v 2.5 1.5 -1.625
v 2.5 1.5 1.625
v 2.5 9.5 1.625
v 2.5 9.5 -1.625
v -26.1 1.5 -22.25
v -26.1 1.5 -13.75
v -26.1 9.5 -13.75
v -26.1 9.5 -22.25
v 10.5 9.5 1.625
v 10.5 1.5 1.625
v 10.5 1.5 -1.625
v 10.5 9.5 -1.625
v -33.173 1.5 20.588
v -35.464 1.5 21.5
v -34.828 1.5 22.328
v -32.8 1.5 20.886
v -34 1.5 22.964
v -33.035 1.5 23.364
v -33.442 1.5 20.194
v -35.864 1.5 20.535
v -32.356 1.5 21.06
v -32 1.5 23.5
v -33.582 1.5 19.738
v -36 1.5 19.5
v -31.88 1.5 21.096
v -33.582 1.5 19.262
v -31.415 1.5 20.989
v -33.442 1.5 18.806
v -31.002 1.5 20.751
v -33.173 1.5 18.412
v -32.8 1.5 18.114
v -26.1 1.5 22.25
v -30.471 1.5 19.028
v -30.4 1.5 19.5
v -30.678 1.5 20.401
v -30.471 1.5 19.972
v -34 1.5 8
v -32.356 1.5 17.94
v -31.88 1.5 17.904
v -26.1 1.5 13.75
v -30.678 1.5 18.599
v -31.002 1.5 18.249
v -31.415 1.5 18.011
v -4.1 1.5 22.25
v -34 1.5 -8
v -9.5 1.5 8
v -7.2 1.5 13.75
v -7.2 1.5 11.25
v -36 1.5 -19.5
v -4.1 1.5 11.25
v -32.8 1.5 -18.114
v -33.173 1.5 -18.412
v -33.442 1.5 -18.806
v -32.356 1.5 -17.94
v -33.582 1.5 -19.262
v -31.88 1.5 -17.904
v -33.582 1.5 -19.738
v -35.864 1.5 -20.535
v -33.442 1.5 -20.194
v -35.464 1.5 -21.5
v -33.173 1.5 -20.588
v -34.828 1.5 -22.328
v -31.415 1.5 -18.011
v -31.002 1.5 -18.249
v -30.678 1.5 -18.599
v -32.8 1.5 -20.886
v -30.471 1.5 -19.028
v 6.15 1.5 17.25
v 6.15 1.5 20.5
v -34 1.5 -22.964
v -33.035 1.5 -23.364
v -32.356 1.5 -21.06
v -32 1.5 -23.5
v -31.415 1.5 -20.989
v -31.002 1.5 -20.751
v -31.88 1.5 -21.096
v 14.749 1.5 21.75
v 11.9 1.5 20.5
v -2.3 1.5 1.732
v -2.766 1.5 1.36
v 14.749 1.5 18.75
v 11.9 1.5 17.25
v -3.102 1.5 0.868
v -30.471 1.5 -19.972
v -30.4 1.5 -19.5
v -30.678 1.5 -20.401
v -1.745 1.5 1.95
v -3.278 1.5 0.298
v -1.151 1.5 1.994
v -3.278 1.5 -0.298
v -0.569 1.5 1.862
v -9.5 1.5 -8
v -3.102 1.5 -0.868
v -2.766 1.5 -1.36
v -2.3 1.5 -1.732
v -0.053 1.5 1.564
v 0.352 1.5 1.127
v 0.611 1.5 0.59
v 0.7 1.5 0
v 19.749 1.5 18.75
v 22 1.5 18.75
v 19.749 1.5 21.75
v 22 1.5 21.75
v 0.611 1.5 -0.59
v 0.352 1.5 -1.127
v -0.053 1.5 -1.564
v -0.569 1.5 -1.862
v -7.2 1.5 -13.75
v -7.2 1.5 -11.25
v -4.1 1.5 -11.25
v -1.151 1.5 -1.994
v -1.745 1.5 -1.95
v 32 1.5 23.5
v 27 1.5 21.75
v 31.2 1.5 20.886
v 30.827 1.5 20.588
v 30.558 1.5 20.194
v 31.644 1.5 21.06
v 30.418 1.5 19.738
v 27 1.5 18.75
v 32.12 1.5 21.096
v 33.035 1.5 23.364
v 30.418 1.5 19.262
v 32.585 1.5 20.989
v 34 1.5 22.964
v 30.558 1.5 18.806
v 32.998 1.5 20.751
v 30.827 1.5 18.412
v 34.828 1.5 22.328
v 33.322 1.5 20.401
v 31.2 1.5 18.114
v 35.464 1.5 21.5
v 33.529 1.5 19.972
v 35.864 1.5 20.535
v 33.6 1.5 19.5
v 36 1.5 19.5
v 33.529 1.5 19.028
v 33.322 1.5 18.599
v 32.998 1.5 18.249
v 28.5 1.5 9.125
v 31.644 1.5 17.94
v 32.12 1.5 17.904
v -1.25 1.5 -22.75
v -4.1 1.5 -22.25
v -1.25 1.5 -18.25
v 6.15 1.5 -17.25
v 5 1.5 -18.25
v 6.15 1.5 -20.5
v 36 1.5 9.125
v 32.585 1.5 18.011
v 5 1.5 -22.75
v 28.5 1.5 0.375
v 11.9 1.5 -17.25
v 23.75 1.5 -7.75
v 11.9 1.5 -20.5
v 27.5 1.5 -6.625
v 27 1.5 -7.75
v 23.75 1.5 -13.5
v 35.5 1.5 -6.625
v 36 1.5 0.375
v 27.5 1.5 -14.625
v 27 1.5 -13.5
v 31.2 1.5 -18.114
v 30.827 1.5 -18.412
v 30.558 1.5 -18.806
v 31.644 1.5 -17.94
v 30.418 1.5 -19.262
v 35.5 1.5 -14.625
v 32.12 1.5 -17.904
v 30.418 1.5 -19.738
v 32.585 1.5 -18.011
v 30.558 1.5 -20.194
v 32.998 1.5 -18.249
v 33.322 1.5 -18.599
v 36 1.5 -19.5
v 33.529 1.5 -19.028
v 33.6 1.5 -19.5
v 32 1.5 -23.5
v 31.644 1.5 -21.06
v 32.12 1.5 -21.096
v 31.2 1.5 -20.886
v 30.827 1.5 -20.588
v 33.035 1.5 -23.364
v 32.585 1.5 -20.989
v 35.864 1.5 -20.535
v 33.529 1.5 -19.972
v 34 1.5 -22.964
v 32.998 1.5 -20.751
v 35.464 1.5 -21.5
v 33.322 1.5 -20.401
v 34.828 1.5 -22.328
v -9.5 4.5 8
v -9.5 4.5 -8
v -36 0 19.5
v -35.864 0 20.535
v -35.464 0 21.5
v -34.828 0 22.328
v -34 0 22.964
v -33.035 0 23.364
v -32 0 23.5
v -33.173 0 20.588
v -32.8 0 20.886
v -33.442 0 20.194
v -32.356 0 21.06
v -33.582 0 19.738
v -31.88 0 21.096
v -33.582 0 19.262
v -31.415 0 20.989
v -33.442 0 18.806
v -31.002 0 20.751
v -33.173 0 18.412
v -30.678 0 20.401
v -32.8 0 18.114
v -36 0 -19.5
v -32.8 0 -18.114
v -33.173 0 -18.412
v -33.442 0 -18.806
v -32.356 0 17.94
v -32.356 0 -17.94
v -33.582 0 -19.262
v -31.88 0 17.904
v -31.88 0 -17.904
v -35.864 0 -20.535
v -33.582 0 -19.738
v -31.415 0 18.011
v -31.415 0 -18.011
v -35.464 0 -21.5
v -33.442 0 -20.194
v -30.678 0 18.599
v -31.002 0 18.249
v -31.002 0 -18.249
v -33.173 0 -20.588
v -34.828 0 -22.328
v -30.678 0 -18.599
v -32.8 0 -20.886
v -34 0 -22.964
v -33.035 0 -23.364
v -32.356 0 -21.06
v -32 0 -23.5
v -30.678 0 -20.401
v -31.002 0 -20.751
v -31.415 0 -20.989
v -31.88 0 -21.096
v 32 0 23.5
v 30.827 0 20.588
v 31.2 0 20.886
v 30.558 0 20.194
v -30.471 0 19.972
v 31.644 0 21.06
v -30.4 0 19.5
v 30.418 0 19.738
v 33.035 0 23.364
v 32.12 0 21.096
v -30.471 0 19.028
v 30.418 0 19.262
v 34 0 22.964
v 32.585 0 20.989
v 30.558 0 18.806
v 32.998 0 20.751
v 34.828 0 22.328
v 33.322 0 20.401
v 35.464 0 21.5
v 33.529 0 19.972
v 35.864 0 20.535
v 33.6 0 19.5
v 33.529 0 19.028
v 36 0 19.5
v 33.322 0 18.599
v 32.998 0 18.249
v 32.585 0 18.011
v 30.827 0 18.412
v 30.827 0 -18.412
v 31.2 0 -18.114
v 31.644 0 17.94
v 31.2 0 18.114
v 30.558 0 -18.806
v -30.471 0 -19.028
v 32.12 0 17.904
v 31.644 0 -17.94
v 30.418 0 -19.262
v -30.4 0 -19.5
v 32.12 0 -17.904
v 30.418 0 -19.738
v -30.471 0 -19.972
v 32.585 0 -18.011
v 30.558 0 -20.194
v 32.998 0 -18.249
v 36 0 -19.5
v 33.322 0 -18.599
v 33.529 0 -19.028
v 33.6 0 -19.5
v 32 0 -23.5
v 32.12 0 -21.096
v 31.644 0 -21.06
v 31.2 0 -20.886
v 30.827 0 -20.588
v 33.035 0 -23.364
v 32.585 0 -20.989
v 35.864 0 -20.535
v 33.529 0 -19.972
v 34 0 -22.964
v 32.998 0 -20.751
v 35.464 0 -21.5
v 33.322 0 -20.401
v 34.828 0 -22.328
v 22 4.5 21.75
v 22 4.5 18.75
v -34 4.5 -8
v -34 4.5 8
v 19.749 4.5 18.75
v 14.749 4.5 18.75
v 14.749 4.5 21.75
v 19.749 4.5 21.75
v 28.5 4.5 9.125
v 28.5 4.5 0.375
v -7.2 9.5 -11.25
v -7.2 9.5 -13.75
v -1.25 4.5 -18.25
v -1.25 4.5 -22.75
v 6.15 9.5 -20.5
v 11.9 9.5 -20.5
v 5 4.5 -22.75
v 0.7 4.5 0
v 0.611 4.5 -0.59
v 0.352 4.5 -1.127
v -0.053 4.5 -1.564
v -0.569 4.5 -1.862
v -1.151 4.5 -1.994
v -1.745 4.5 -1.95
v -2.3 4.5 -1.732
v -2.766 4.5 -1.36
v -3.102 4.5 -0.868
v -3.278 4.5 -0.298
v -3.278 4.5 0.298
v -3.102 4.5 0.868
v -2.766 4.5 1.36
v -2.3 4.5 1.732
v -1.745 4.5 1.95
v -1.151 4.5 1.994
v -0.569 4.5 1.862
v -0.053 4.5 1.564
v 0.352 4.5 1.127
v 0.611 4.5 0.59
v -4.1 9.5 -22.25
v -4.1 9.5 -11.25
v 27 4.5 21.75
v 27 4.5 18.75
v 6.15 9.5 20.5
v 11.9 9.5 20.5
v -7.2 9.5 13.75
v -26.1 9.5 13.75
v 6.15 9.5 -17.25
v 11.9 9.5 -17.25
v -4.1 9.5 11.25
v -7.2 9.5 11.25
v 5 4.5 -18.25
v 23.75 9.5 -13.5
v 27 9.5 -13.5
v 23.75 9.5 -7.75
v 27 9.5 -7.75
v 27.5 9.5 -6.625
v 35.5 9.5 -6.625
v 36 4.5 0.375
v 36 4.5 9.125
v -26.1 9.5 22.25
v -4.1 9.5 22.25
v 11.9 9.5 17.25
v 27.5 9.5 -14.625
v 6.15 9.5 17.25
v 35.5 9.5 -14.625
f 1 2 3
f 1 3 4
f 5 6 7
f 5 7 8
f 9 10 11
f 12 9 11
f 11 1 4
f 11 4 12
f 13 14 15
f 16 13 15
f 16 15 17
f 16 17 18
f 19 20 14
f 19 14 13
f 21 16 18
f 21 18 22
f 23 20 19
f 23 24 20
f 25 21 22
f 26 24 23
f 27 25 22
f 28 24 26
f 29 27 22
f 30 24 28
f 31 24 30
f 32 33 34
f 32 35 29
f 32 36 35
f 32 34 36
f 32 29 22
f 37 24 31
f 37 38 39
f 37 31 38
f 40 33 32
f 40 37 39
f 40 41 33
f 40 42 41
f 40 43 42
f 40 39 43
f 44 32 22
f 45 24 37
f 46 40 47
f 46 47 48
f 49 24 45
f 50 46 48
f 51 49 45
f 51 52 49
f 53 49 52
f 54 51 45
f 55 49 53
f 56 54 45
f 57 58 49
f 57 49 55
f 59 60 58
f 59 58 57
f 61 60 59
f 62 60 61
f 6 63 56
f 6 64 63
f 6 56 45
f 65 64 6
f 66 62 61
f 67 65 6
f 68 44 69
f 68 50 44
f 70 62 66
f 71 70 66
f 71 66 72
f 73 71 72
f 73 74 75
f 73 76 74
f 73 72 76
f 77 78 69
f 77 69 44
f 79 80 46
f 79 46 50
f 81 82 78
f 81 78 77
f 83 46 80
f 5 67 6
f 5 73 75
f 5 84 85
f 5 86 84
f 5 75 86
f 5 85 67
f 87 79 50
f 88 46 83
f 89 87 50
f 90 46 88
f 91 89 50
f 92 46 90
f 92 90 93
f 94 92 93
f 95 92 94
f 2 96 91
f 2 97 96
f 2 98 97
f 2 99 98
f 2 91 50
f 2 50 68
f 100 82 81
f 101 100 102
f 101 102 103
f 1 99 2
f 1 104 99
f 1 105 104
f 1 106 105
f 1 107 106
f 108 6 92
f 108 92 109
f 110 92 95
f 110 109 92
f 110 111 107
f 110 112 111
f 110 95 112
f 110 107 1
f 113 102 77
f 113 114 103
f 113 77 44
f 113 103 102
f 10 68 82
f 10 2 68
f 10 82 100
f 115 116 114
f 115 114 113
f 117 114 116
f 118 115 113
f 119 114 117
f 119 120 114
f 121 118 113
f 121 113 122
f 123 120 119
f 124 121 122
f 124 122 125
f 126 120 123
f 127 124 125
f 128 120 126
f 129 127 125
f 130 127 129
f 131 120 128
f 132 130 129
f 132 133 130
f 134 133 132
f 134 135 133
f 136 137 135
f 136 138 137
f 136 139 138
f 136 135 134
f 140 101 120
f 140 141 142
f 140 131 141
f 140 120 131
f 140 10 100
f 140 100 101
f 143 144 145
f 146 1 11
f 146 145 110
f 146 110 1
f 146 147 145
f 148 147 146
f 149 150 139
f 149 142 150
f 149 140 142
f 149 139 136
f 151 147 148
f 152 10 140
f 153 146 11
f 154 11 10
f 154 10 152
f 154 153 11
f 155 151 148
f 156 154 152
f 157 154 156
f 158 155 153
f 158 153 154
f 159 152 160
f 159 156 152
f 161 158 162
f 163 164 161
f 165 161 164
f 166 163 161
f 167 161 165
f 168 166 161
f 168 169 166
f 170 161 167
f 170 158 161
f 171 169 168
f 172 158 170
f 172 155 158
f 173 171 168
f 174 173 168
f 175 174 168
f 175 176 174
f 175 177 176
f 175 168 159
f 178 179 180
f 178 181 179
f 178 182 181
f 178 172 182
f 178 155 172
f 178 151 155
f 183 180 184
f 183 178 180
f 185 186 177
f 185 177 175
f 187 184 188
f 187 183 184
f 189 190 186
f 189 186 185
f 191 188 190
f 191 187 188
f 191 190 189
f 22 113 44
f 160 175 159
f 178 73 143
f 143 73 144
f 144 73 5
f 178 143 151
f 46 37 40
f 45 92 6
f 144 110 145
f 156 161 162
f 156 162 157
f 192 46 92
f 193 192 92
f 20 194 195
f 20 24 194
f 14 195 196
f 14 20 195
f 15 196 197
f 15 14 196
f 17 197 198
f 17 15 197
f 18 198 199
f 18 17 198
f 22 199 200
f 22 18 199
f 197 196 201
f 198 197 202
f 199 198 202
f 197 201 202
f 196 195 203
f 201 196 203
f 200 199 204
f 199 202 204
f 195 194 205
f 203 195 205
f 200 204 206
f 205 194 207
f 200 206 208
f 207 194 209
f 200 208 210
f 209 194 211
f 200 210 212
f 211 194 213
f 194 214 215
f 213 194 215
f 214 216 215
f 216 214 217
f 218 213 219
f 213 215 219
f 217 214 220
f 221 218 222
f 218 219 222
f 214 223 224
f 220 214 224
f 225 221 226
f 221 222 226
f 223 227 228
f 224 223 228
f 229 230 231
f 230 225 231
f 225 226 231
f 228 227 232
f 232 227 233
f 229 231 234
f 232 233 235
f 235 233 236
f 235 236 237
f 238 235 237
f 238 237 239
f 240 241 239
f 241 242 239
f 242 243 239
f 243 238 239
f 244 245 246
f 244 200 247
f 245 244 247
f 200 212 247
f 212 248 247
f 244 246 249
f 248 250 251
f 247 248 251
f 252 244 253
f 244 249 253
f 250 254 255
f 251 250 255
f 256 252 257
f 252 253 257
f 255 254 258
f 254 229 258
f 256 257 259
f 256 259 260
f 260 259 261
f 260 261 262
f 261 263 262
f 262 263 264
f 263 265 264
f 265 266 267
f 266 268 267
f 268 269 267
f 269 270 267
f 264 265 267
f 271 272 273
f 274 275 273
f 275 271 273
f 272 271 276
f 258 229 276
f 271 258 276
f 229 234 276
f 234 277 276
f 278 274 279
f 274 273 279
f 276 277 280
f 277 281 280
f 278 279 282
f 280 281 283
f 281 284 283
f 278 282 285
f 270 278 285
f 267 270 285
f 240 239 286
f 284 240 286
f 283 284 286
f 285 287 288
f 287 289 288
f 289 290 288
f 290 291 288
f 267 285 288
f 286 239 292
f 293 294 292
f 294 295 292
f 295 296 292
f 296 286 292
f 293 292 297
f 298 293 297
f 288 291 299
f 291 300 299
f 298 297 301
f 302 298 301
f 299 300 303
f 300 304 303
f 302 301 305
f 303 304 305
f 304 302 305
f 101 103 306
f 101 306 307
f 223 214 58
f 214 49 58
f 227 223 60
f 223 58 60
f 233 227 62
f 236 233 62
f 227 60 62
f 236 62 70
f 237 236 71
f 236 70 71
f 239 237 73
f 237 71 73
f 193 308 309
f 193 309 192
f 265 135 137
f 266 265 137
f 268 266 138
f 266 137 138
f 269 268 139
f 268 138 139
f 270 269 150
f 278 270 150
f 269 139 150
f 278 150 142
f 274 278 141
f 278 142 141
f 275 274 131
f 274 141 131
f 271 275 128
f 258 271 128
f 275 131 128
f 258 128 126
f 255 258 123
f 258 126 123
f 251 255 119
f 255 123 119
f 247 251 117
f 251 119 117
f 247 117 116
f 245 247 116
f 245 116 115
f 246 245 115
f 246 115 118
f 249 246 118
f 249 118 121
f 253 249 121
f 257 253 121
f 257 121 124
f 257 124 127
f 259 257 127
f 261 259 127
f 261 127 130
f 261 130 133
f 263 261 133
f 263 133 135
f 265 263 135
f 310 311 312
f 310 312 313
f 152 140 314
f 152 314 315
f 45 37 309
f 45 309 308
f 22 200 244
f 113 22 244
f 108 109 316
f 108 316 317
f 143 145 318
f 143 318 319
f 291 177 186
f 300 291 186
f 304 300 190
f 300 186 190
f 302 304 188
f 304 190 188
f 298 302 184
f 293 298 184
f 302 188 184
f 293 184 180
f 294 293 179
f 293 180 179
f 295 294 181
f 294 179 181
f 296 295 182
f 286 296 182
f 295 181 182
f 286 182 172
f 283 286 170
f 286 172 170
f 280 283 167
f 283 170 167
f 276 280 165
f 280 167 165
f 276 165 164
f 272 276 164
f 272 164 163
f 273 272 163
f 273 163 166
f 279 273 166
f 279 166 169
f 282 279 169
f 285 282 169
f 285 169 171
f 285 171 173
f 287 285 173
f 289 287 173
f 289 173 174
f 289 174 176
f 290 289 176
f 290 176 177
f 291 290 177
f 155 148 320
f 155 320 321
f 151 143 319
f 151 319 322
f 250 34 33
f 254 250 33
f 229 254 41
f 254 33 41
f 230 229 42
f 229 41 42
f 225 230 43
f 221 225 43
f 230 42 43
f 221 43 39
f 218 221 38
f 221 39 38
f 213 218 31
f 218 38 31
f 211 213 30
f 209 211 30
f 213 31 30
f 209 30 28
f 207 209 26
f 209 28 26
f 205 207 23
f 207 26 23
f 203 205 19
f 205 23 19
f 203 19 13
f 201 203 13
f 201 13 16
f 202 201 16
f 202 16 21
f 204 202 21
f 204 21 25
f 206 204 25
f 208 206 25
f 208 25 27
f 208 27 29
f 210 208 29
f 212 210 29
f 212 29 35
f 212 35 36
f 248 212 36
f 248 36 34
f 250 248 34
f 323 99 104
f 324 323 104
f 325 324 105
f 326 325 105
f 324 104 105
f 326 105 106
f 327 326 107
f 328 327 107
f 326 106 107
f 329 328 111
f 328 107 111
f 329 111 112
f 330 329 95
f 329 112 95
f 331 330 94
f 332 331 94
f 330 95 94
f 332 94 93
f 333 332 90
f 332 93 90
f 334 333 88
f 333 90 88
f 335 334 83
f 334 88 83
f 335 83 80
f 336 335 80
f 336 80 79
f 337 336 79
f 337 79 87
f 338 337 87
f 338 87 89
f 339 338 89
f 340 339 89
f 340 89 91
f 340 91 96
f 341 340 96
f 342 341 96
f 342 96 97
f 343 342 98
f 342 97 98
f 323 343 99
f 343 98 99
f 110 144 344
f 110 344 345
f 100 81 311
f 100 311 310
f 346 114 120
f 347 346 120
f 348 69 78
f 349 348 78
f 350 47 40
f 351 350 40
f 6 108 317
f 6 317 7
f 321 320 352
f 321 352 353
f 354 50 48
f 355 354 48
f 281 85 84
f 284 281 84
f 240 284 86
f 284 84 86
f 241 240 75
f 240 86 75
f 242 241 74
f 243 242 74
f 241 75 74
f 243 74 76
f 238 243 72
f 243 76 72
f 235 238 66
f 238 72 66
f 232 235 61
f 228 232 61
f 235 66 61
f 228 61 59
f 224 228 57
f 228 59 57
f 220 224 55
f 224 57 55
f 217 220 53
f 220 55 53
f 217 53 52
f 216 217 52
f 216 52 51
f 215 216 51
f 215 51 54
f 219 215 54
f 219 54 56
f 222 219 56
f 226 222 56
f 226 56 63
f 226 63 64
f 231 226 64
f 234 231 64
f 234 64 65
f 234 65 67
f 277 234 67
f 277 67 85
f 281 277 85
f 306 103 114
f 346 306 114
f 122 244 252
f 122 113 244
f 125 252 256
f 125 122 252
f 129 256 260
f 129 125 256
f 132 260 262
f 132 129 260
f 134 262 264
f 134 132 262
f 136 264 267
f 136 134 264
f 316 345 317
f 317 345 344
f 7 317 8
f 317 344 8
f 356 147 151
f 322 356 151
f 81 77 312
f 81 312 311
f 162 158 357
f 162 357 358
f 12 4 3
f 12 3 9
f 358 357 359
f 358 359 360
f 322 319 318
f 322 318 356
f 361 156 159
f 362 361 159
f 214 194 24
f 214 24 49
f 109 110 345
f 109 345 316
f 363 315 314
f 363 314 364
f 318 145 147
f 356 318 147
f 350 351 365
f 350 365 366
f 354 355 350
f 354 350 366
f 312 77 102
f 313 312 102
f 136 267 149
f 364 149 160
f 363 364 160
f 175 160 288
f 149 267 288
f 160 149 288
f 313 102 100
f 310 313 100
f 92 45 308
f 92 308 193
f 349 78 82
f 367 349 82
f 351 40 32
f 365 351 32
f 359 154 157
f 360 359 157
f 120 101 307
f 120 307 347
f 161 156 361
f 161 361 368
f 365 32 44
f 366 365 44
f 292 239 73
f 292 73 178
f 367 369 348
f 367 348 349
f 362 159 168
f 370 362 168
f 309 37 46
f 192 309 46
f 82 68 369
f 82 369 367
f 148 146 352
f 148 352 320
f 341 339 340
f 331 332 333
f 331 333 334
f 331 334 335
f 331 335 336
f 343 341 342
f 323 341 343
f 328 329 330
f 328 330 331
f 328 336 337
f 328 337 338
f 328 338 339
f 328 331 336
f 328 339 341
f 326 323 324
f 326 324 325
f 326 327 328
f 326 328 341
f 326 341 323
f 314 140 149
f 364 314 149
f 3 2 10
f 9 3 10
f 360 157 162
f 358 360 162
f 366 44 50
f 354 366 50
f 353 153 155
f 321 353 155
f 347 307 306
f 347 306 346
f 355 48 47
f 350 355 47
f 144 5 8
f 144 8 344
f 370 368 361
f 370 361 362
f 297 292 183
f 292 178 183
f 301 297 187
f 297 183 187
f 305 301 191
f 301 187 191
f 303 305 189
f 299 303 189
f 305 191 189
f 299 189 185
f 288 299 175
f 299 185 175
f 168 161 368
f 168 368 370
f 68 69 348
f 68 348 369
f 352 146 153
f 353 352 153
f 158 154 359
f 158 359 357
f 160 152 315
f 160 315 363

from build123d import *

# Parameters (mm, degrees)
CROQUIS1_W              = 72
CROQUIS1_H              = 47
SALIENTE_EXTRUIR1_DEPTH = 1.5
CROQUIS2_R              = 1.6
CORTAR_EXTRUIR1_DEPTH   = 2.5
REDONDEO1_R             = 4
CROQUIS3_W              = 5.75
CROQUIS3_H              = 3.25
CROQUIS3_W_2            = 3.25
CROQUIS3_H_2            = 5.75
CROQUIS3_W_3            = 8
CROQUIS3_H_3            = 8
SALIENTE_EXTRUIR2_DEPTH = 8
CROQUIS6_R              = 2
CROQUIS6_W              = 7.5
CROQUIS6_H              = 8.749690514
CROQUIS6_W_2            = 5
CROQUIS6_H_2            = 3
CROQUIS6_W_3            = 6.25
CROQUIS6_H_3            = 4.5
CROQUIS6_W_4            = 24.5
CROQUIS6_H_4            = 16
SALIENTE_EXTRUIR3_DEPTH = 3


with BuildPart() as part:
    # Croquis1 → Saliente-Extruir1 (new body)
    with BuildSketch(Plane(origin=(0, 0, 0), x_dir=(1, 0, 0), z_dir=(0, 1, 0))):
        Rectangle(CROQUIS1_W, CROQUIS1_H)
    extrude(amount=SALIENTE_EXTRUIR1_DEPTH)

    # Croquis2 → Cortar-Extruir1 (cut, through all)
    with BuildSketch(Plane(origin=(0, 1.5, 0), x_dir=(1, 0, 0), z_dir=(0, 1, 0))):
        with Locations((-32, 19.5)):
            Circle(CROQUIS2_R)
        with Locations((32, 19.5)):
            Circle(CROQUIS2_R)
        with Locations((32, -19.5)):
            Circle(CROQUIS2_R)
        with Locations((-32, -19.5)):
            Circle(CROQUIS2_R)
    extrude(amount=-CORTAR_EXTRUIR1_DEPTH, mode=Mode.SUBTRACT)

    # Redondeo1
    redondeo1_edges = [part.edges().sort_by_distance(p)[0] for p in [
        (36, 0.75, 23.5),
        (-36, 0.75, 23.5),
        (-36, 0.75, -23.5),
        (36, 0.75, -23.5),
    ]]
    fillet(redondeo1_edges, radius=REDONDEO1_R)

    # Croquis3 → Saliente-Extruir2 (add)
    with BuildSketch(Plane(origin=(0, 1.5, 0), x_dir=(1, 0, 0), z_dir=(0, 1, 0))):
        Polygon((-4.1, 11.25), (-7.2, 11.25), (-7.2, 13.75), (-26.1, 13.75), (-26.1, 22.25), (-4.1, 22.25), align=None)
        with Locations((9.025, -18.875)):
            Rectangle(CROQUIS3_W, CROQUIS3_H)
        with Locations((9.025, 18.875)):
            Rectangle(CROQUIS3_W, CROQUIS3_H)
        Polygon((-7.2, -13.75), (-26.1, -13.75), (-26.1, -22.25), (-4.1, -22.25), (-4.1, -11.25), (-7.2, -11.25), align=None)
        with Locations((25.375, 10.625)):
            Rectangle(CROQUIS3_W_2, CROQUIS3_H_2)
        with Locations((31.5, 10.625)):
            Rectangle(CROQUIS3_W_3, CROQUIS3_H_3)
        with Locations((6.5, 0)):
            Rectangle(CROQUIS3_W_3, CROQUIS3_H)
    extrude(amount=SALIENTE_EXTRUIR2_DEPTH)

    # Croquis6 → Saliente-Extruir3 (add)
    with BuildSketch(Plane(origin=(0, 1.5, 0), x_dir=(1, 0, 0), z_dir=(0, 1, 0))):
        with Locations((-1.3, 0)):
            Circle(CROQUIS6_R)
        with Locations((32.25, -4.749845257)):
            Rectangle(CROQUIS6_W, CROQUIS6_H)
        with Locations((17.248785916, -20.25)):
            Rectangle(CROQUIS6_W_2, CROQUIS6_H_2)
        with Locations((24.5, -20.25)):
            Rectangle(CROQUIS6_W_2, CROQUIS6_H_2)
        with Locations((1.875, 20.5)):
            Rectangle(CROQUIS6_W_3, CROQUIS6_H_3)
        with Locations((-21.75, 0)):
            Rectangle(CROQUIS6_W_4, CROQUIS6_H_4)
    extrude(amount=SALIENTE_EXTRUIR3_DEPTH)


solid = part.part
